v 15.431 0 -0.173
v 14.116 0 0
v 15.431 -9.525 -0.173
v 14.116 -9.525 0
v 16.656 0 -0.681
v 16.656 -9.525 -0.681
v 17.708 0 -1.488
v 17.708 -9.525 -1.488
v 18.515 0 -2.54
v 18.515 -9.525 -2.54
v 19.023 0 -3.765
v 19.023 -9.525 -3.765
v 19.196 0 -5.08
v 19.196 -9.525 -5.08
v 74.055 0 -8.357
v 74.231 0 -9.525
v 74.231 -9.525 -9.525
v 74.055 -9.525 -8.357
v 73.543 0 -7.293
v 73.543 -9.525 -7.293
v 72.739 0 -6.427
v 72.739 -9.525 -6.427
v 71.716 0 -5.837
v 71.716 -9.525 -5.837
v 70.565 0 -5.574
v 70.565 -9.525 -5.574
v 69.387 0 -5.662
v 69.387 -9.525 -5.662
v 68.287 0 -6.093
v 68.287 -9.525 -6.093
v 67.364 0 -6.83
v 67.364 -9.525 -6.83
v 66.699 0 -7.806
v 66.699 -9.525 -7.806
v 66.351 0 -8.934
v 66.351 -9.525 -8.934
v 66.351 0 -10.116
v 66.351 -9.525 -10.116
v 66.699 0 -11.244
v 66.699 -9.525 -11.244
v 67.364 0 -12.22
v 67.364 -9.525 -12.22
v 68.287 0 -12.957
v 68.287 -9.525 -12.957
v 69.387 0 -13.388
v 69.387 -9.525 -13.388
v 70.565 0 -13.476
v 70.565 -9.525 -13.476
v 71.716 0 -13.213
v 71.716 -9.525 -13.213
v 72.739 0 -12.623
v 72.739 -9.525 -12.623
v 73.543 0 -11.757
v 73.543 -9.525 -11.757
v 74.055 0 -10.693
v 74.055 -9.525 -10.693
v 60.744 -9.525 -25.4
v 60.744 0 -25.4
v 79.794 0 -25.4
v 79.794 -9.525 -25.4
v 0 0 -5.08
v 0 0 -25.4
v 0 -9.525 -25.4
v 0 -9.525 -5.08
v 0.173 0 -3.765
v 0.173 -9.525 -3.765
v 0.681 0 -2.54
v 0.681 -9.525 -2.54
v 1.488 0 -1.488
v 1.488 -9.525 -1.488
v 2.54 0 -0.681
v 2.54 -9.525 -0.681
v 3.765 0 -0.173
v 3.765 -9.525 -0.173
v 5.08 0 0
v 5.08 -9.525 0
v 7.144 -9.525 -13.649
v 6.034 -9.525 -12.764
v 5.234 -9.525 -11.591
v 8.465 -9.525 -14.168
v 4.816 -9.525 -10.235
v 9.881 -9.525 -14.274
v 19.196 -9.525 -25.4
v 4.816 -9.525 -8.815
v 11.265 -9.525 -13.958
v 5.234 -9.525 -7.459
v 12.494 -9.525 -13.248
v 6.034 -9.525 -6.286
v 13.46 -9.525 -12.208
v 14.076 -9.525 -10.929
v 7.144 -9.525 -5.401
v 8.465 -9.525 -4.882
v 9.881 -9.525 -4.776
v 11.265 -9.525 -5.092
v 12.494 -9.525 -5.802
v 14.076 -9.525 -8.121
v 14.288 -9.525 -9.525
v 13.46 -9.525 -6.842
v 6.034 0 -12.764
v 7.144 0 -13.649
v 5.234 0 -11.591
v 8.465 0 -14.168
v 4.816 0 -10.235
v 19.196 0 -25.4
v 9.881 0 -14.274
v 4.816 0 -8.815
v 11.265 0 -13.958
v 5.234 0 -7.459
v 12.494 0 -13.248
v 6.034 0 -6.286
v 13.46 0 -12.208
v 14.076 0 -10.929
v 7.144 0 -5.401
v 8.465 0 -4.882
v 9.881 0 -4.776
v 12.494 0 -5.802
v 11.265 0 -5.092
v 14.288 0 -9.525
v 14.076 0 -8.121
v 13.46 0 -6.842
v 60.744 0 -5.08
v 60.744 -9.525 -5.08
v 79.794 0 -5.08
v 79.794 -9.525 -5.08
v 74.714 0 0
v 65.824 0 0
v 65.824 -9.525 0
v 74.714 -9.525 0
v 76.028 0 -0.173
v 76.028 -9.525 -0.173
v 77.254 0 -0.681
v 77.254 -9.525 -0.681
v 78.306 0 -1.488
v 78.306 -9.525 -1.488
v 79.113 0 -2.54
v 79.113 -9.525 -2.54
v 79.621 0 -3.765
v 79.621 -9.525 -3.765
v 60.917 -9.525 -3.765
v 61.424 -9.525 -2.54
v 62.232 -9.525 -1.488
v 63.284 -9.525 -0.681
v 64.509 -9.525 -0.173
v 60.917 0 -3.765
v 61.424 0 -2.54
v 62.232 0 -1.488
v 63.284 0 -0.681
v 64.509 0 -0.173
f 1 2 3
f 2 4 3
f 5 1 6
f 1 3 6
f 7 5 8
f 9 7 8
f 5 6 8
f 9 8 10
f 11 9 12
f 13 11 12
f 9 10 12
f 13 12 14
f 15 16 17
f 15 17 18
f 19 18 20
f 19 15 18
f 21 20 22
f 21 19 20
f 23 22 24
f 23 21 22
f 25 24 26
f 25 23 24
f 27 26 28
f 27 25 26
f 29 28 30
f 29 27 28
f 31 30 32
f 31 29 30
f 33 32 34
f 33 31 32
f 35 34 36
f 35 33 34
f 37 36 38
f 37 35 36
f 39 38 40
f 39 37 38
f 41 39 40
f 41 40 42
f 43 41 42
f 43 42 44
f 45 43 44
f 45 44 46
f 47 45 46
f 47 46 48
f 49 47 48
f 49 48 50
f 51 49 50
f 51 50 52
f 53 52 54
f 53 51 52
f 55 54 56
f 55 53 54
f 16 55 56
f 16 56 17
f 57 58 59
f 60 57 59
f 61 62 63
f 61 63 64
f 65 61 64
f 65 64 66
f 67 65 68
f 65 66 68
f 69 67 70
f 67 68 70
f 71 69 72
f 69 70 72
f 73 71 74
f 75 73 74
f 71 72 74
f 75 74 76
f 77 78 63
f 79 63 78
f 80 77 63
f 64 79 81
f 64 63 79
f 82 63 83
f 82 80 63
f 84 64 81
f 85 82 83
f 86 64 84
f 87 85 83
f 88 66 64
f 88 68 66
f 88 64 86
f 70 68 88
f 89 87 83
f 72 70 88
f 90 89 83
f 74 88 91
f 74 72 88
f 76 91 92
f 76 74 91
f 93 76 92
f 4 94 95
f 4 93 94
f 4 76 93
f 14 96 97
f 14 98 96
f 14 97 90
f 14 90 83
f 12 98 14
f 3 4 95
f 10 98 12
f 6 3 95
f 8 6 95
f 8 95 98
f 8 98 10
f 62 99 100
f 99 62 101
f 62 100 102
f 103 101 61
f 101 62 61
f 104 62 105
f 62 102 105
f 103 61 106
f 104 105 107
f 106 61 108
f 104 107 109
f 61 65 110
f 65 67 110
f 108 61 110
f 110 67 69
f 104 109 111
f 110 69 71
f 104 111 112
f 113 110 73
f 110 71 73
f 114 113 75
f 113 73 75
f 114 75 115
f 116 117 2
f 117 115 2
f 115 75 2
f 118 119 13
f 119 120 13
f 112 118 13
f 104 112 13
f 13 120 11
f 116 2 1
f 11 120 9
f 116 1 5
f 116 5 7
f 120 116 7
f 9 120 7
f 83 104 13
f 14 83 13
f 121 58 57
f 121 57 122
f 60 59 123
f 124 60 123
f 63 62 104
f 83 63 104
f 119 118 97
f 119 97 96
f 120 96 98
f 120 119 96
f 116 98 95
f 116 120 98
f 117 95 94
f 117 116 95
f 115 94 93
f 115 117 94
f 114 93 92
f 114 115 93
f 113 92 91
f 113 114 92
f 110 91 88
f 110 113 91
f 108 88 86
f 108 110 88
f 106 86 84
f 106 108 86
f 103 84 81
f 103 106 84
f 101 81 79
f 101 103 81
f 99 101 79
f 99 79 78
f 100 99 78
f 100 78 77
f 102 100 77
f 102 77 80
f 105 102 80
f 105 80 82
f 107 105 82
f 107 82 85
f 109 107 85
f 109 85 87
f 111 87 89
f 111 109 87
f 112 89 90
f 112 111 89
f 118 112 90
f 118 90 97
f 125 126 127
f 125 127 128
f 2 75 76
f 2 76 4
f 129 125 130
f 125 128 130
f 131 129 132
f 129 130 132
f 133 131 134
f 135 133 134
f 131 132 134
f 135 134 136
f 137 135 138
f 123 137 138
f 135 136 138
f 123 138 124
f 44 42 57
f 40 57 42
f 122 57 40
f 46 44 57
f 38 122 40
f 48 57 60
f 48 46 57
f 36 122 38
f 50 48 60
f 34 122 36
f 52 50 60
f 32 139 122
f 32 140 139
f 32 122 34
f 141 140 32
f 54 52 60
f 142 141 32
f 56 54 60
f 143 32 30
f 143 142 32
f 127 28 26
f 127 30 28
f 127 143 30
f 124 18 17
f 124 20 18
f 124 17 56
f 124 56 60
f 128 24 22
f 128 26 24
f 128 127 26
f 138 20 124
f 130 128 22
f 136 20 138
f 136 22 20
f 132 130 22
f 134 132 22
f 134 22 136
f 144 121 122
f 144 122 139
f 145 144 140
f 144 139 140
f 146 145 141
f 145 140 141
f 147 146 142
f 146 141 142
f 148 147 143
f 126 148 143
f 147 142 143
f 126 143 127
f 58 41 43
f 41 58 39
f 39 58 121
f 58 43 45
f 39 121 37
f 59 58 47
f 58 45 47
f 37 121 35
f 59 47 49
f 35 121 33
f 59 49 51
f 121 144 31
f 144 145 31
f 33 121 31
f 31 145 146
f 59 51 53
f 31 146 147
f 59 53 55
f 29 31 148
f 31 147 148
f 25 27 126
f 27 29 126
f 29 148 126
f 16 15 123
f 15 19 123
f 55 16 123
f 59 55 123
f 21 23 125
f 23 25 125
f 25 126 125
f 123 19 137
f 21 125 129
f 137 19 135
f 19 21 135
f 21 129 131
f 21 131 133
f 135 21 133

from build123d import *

# Parameters (mm, degrees)
F0_W      = 19.195897
F0_H      = 25.4
F0_R      = 4.7625
F0_W_2    = 19.05
F0_R_2    = 3.9624
F1_DEPTH  = 9.525
F1_FACE_W = 19.195897
F1_FACE_H = 25.4
F1_FACE_R = 4.7625
F2_DEPTH  = 9.525
F3_R      = 5.08
F4_R      = 5.08


with BuildPart() as f1:
    # F0 (on Front) → F1 (new body)
    with BuildSketch(Plane.XZ):
        with Locations((9.597948, -12.7)):
            Rectangle(F0_W, F0_H)
        with Locations((9.525, -9.525)):
            Circle(F0_R, mode=Mode.SUBTRACT)
        with Locations((70.268682, -12.7)):
            Rectangle(F0_W_2, F0_H)
        with Locations((70.268682, -9.525)):
            Circle(F0_R_2, mode=Mode.SUBTRACT)
    extrude(amount=F1_DEPTH)

    # F1_face (on face) → F2 (join)
    with BuildSketch(Plane(origin=(9.610434, 0, -13.243421), x_dir=(1, 0, 0), z_dir=(0, 1, 0))):
        with Locations((-0.012486, -0.543421)):
            Rectangle(F1_FACE_W, F1_FACE_H)
        with Locations((-0.085434, -3.718421)):
            Circle(F1_FACE_R, mode=Mode.SUBTRACT)
    extrude(amount=-F2_DEPTH)

    # F3
    f3_edges = [f1.edges().sort_by_distance(p)[0] for p in [
        (60.743682, -4.7625, 0),
        (79.793682, -4.7625, 0),
    ]]
    fillet(f3_edges, radius=F3_R)

    # F4
    f4_edges = [f1.edges().sort_by_distance(p)[0] for p in [
        (19.195897, -4.7625, 0),
        (0, -4.7625, 0),
    ]]
    fillet(f4_edges, radius=F4_R)


solid = f1.part
